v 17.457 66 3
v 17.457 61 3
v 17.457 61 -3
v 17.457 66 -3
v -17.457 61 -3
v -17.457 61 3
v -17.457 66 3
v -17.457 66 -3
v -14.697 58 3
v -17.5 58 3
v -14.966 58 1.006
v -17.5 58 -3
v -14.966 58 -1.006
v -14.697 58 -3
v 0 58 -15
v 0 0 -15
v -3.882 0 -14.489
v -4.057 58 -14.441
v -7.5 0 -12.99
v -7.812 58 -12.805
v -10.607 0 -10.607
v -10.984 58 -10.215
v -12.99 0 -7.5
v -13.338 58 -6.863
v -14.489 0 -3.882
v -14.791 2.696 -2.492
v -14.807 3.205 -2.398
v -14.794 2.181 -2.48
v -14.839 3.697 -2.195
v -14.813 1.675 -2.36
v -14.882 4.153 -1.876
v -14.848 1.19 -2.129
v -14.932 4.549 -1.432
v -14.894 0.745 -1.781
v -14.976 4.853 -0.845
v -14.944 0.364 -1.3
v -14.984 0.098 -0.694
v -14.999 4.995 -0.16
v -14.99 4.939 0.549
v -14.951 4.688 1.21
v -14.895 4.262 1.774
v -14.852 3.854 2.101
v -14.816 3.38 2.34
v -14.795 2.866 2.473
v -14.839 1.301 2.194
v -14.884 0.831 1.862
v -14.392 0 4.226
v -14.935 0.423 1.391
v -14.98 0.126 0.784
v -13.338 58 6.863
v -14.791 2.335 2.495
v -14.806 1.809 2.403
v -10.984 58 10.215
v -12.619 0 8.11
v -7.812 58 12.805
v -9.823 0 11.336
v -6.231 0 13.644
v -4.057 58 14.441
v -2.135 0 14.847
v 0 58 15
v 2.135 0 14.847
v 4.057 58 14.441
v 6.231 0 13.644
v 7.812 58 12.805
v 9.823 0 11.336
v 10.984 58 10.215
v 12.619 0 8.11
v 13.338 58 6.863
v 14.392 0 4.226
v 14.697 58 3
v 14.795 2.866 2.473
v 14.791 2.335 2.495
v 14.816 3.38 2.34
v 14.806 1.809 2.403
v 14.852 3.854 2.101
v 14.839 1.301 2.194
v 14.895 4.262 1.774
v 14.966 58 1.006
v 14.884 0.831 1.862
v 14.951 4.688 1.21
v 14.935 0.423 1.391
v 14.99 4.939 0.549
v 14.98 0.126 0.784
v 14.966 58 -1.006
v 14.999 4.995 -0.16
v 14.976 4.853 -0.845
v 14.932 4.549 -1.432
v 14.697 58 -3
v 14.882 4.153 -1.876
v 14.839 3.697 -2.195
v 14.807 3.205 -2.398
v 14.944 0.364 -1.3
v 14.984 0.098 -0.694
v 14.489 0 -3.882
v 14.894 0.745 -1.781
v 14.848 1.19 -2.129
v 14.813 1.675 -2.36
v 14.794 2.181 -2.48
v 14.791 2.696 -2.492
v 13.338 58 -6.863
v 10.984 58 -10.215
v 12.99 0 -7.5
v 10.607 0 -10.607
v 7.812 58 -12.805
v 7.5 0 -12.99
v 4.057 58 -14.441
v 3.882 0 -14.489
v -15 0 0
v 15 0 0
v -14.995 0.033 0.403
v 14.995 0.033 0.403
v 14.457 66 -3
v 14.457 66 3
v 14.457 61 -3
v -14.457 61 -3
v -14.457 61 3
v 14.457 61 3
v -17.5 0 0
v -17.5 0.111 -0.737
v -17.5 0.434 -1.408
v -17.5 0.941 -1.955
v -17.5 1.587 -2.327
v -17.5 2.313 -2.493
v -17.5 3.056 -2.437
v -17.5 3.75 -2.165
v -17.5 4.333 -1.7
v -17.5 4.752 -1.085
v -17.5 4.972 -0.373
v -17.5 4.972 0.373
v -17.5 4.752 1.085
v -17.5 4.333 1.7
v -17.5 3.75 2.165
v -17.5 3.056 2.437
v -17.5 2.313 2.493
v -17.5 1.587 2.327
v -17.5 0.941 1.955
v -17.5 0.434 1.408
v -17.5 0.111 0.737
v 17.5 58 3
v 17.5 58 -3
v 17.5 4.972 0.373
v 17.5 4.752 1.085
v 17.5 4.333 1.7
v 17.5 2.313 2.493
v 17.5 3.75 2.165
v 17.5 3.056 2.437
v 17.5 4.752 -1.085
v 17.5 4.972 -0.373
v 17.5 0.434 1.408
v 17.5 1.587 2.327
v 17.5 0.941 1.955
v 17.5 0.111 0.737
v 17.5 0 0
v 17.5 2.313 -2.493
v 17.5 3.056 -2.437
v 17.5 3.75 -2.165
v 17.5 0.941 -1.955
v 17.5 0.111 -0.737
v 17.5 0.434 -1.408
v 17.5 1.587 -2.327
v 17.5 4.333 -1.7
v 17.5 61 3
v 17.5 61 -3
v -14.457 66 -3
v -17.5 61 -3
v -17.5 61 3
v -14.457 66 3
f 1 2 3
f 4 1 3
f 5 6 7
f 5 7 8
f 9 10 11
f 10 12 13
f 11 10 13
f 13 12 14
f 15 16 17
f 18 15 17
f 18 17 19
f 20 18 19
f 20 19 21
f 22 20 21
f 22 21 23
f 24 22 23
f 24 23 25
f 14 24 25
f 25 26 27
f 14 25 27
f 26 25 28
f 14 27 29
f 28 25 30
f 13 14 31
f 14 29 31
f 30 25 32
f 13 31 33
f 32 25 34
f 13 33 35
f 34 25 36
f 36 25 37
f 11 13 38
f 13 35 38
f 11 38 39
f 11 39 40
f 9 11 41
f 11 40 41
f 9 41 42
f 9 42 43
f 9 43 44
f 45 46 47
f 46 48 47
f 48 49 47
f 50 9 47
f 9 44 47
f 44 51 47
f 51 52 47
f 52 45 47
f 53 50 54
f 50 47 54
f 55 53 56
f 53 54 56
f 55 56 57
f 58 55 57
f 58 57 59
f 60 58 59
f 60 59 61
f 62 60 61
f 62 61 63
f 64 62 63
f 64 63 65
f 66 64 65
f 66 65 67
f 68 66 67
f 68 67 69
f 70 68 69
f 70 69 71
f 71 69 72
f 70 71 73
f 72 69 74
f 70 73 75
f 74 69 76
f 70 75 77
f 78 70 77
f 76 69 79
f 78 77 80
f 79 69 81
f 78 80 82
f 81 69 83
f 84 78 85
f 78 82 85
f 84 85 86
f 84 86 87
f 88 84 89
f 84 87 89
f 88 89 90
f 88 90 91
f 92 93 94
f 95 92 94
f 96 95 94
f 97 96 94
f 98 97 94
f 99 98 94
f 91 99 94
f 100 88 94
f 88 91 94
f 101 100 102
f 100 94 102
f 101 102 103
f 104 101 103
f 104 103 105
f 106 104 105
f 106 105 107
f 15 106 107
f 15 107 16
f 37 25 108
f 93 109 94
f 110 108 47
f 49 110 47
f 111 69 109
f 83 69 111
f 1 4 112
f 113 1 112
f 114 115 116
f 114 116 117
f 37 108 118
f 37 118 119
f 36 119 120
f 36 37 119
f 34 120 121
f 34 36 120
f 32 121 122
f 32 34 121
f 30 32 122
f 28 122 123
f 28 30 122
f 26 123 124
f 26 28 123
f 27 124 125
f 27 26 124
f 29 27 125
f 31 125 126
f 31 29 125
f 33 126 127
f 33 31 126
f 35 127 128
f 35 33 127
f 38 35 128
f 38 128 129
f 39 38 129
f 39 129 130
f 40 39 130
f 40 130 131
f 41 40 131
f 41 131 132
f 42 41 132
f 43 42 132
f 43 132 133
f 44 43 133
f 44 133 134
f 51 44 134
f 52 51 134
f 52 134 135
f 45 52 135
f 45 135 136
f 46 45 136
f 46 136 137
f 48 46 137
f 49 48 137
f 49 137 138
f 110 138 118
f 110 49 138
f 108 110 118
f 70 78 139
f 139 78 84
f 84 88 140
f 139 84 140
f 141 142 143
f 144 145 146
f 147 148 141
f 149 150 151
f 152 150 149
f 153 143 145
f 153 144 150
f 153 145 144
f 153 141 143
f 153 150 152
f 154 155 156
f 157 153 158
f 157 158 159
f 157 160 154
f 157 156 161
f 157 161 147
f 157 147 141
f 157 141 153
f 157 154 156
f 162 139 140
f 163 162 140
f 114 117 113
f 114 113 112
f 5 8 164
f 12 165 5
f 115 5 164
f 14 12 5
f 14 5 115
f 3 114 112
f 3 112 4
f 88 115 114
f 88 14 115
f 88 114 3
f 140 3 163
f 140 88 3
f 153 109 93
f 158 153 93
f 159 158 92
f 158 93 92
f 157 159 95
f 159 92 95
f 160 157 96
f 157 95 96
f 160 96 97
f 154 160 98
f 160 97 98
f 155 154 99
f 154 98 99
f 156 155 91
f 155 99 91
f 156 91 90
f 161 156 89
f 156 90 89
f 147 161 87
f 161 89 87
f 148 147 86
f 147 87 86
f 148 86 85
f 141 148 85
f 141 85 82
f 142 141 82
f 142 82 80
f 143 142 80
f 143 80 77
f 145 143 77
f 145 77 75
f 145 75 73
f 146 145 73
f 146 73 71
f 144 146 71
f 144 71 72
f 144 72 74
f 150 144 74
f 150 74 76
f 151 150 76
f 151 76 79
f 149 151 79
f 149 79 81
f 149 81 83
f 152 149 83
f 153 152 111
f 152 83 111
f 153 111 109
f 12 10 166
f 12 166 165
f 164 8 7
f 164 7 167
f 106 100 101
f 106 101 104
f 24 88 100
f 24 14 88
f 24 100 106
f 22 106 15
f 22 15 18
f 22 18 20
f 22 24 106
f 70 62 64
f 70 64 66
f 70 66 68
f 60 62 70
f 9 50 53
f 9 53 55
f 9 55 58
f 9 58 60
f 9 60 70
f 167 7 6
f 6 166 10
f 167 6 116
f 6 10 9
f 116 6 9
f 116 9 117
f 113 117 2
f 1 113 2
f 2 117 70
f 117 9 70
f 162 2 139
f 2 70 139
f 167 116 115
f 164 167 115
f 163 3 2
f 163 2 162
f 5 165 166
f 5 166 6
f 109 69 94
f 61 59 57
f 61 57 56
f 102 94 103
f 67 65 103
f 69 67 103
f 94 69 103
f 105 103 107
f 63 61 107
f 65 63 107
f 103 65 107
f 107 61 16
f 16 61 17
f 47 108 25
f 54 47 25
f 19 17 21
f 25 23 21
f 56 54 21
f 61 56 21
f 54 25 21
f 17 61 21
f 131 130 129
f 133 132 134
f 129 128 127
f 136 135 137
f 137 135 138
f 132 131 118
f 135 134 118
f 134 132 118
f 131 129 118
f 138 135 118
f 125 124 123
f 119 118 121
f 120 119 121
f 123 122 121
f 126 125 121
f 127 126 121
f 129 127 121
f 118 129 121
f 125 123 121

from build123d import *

# Parameters (mm, degrees)
SKETCH1_R           = 15
BOSS_EXTRUDE1_DEPTH = 58
SKETCH4_W           = 35
SKETCH4_H           = 6
BOSS_EXTRUDE3_DEPTH = 3
SKETCH5_W           = 3
SKETCH5_H           = 6
BOSS_EXTRUDE4_DEPTH = 5
SKETCH6_R           = 2.5
BOSS_EXTRUDE5_DEPTH = 17.5


with BuildPart() as part:
    # Sketch1 → Boss-Extrude1 (new body)
    with BuildSketch(Plane(origin=(0, 0, 0), x_dir=(1, 0, 0), z_dir=(0, 1, 0))):
        with Locations(Location((0, 0, 0), (0, 0, 90))):
            Circle(SKETCH1_R)
    extrude(amount=BOSS_EXTRUDE1_DEPTH)

    # Sketch4 → Boss-Extrude3 (add)
    with BuildSketch(Plane(origin=(0, 58, 0), x_dir=(1, 0, 0), z_dir=(0, 1, 0))):
        Rectangle(SKETCH4_W, SKETCH4_H)
    extrude(amount=BOSS_EXTRUDE3_DEPTH)

    # Sketch5 → Boss-Extrude4 (add)
    with BuildSketch(Plane(origin=(0, 61, 0), x_dir=(1, 0, 0), z_dir=(0, 1, 0))):
        with Locations((-15.95745503, 0)):
            Rectangle(SKETCH5_W, SKETCH5_H)
    boss_extrude4 = extrude(amount=BOSS_EXTRUDE4_DEPTH)

    # Mirror2: Boss-Extrude4 across plane
    add(boss_extrude4.mirror(Plane(origin=(0, 0, 0), x_dir=(0, 0, 1), z_dir=(1, 0, 0))))

    # Sketch6 → Boss-Extrude5 (add)
    with BuildSketch(Plane(origin=(0, 0, 0), x_dir=(0, 0, -1), z_dir=(1, 0, 0))):
        with Locations(Location((0, 2.5, 0), (0, 0, 270))):
            Circle(SKETCH6_R)
    boss_extrude5 = extrude(amount=BOSS_EXTRUDE5_DEPTH)

    # Mirror3: Boss-Extrude5 across plane
    add(boss_extrude5.mirror(Plane(origin=(0, 0, 0), x_dir=(0, 0, 1), z_dir=(1, 0, 0))))


solid = part.part
